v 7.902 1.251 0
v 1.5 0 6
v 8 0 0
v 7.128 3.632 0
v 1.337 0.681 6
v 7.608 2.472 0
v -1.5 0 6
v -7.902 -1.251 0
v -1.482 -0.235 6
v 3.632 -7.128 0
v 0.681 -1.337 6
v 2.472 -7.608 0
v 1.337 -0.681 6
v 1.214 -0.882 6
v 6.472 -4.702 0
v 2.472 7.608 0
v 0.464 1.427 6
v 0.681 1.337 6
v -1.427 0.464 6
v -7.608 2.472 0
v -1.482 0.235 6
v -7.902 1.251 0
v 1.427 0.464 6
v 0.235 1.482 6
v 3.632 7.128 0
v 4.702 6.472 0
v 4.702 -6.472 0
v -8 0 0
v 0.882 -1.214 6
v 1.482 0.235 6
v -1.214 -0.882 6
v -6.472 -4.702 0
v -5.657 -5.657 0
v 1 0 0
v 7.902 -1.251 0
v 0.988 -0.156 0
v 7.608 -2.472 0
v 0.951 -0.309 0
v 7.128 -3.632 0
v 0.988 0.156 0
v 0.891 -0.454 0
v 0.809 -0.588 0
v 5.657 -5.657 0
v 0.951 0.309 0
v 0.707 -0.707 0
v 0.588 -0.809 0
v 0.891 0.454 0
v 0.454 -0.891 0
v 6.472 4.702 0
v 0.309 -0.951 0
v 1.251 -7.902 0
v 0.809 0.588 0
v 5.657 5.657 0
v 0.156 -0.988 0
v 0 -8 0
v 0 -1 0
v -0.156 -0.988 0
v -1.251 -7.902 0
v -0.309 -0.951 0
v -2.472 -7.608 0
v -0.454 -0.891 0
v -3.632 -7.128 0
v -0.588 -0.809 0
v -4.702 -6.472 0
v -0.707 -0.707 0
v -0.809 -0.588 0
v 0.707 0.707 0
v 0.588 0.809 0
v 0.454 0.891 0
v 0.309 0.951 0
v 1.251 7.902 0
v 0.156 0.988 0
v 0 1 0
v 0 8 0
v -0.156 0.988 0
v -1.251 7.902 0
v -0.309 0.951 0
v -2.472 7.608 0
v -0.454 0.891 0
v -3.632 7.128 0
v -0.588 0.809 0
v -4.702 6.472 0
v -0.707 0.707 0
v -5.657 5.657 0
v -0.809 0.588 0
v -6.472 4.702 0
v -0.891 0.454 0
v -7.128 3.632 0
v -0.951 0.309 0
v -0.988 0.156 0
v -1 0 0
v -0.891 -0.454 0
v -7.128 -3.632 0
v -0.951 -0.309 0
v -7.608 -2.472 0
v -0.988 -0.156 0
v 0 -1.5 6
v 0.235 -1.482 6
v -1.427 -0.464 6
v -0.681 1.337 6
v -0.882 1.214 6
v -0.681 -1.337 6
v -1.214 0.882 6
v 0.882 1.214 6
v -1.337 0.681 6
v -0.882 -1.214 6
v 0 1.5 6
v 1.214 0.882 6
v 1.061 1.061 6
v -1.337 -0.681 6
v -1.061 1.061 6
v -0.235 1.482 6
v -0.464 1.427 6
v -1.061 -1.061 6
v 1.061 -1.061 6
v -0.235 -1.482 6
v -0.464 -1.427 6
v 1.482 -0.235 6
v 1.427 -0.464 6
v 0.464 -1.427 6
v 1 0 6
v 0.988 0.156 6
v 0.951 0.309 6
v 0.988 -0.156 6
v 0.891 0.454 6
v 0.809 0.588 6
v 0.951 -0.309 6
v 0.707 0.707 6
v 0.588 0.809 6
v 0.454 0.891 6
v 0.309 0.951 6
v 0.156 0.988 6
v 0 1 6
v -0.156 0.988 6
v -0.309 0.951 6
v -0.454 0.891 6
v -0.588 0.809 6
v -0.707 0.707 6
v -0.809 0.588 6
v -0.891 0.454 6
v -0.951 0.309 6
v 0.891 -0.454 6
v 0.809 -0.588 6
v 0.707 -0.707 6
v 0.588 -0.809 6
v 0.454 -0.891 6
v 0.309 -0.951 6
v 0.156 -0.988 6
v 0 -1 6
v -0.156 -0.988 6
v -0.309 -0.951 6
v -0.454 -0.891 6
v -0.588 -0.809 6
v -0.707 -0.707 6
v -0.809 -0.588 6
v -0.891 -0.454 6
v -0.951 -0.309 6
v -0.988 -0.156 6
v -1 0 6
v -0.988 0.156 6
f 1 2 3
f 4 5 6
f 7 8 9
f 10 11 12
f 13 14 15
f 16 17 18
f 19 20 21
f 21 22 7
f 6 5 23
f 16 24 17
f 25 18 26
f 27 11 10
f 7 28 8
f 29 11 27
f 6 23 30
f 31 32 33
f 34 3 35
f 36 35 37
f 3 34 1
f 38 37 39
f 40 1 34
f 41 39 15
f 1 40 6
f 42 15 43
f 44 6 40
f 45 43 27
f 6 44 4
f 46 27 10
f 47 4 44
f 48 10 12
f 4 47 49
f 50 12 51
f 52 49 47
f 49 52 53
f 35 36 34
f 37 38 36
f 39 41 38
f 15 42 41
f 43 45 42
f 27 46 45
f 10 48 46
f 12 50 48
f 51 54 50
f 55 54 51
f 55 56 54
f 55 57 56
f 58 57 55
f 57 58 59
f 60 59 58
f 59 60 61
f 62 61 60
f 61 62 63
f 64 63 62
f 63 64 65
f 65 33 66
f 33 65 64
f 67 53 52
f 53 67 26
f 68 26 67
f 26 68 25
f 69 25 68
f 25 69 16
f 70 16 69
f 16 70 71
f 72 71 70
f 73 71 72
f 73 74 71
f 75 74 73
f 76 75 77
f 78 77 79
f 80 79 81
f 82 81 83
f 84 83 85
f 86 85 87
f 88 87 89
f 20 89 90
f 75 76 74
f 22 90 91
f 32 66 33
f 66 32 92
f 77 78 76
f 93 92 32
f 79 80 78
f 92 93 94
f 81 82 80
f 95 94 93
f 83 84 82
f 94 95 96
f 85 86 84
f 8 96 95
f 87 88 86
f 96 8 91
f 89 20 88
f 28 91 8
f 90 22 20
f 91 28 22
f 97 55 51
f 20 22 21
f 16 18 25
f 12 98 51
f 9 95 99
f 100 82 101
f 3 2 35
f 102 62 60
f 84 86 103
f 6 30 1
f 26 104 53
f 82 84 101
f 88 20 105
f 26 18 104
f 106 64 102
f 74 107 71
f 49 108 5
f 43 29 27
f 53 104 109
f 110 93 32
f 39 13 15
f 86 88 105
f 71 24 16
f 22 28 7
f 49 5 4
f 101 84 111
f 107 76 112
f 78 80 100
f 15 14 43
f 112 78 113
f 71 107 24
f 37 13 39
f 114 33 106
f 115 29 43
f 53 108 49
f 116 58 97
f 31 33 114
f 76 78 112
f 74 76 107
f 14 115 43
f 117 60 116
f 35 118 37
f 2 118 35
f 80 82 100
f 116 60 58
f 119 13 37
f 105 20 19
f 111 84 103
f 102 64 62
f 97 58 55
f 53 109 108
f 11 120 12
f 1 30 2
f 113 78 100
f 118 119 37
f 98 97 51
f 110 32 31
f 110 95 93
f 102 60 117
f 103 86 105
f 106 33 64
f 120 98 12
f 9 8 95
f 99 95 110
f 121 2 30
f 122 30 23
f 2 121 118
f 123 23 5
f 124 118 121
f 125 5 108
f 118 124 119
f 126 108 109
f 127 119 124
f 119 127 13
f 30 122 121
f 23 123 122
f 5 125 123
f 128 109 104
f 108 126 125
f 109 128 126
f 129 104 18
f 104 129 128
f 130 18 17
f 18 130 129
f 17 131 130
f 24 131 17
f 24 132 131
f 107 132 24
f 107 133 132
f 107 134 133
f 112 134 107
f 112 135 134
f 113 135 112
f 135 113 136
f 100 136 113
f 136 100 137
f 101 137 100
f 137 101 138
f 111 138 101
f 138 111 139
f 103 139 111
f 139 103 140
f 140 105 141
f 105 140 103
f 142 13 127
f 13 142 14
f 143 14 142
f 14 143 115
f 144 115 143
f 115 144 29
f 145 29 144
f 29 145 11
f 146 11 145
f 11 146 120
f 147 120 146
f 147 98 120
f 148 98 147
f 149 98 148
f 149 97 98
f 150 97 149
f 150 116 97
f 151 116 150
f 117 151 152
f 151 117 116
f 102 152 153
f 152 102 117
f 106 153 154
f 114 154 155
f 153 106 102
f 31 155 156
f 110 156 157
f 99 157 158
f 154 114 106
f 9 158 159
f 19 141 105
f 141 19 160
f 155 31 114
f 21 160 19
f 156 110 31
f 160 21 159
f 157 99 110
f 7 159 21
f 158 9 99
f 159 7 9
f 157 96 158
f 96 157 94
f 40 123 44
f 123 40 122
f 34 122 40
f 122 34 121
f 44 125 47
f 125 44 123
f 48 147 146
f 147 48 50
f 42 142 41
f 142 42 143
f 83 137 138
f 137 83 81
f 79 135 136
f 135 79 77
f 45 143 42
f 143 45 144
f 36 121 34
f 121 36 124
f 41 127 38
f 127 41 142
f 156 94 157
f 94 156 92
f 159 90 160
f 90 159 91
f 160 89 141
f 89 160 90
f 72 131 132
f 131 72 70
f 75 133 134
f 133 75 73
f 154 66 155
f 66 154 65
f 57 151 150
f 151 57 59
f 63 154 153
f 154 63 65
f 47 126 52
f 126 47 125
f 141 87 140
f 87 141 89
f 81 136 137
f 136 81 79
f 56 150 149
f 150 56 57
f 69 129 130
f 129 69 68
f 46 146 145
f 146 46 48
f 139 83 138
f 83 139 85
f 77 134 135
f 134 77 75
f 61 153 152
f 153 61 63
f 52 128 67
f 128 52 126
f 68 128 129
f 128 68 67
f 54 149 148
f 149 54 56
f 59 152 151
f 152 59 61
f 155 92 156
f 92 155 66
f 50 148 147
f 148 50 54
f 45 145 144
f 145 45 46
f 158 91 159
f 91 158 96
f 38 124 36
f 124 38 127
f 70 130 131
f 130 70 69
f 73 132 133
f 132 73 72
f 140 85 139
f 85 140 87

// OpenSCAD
// [FL_INDEX: keywords="openscad, 3d_parametric, Filament_Bend_Prevention_Cone-Customizable, csg_solid" | COT="Parametric OpenSCAD design from 3DCodeverse"]
// Title: Filament Bend Prevention Cone-Customizable!

//bottom radius
r1=8;
//top radius
r2=1.5;
//hole radius
r3=1;
//height
h=6;

difference(){
	cylinder(r1=r1,r2=r2,h=h,$fn=40);
	translate([0,0,-0.05])
		cylinder(r=r3,h=h+0.1,$fn=40);
}
